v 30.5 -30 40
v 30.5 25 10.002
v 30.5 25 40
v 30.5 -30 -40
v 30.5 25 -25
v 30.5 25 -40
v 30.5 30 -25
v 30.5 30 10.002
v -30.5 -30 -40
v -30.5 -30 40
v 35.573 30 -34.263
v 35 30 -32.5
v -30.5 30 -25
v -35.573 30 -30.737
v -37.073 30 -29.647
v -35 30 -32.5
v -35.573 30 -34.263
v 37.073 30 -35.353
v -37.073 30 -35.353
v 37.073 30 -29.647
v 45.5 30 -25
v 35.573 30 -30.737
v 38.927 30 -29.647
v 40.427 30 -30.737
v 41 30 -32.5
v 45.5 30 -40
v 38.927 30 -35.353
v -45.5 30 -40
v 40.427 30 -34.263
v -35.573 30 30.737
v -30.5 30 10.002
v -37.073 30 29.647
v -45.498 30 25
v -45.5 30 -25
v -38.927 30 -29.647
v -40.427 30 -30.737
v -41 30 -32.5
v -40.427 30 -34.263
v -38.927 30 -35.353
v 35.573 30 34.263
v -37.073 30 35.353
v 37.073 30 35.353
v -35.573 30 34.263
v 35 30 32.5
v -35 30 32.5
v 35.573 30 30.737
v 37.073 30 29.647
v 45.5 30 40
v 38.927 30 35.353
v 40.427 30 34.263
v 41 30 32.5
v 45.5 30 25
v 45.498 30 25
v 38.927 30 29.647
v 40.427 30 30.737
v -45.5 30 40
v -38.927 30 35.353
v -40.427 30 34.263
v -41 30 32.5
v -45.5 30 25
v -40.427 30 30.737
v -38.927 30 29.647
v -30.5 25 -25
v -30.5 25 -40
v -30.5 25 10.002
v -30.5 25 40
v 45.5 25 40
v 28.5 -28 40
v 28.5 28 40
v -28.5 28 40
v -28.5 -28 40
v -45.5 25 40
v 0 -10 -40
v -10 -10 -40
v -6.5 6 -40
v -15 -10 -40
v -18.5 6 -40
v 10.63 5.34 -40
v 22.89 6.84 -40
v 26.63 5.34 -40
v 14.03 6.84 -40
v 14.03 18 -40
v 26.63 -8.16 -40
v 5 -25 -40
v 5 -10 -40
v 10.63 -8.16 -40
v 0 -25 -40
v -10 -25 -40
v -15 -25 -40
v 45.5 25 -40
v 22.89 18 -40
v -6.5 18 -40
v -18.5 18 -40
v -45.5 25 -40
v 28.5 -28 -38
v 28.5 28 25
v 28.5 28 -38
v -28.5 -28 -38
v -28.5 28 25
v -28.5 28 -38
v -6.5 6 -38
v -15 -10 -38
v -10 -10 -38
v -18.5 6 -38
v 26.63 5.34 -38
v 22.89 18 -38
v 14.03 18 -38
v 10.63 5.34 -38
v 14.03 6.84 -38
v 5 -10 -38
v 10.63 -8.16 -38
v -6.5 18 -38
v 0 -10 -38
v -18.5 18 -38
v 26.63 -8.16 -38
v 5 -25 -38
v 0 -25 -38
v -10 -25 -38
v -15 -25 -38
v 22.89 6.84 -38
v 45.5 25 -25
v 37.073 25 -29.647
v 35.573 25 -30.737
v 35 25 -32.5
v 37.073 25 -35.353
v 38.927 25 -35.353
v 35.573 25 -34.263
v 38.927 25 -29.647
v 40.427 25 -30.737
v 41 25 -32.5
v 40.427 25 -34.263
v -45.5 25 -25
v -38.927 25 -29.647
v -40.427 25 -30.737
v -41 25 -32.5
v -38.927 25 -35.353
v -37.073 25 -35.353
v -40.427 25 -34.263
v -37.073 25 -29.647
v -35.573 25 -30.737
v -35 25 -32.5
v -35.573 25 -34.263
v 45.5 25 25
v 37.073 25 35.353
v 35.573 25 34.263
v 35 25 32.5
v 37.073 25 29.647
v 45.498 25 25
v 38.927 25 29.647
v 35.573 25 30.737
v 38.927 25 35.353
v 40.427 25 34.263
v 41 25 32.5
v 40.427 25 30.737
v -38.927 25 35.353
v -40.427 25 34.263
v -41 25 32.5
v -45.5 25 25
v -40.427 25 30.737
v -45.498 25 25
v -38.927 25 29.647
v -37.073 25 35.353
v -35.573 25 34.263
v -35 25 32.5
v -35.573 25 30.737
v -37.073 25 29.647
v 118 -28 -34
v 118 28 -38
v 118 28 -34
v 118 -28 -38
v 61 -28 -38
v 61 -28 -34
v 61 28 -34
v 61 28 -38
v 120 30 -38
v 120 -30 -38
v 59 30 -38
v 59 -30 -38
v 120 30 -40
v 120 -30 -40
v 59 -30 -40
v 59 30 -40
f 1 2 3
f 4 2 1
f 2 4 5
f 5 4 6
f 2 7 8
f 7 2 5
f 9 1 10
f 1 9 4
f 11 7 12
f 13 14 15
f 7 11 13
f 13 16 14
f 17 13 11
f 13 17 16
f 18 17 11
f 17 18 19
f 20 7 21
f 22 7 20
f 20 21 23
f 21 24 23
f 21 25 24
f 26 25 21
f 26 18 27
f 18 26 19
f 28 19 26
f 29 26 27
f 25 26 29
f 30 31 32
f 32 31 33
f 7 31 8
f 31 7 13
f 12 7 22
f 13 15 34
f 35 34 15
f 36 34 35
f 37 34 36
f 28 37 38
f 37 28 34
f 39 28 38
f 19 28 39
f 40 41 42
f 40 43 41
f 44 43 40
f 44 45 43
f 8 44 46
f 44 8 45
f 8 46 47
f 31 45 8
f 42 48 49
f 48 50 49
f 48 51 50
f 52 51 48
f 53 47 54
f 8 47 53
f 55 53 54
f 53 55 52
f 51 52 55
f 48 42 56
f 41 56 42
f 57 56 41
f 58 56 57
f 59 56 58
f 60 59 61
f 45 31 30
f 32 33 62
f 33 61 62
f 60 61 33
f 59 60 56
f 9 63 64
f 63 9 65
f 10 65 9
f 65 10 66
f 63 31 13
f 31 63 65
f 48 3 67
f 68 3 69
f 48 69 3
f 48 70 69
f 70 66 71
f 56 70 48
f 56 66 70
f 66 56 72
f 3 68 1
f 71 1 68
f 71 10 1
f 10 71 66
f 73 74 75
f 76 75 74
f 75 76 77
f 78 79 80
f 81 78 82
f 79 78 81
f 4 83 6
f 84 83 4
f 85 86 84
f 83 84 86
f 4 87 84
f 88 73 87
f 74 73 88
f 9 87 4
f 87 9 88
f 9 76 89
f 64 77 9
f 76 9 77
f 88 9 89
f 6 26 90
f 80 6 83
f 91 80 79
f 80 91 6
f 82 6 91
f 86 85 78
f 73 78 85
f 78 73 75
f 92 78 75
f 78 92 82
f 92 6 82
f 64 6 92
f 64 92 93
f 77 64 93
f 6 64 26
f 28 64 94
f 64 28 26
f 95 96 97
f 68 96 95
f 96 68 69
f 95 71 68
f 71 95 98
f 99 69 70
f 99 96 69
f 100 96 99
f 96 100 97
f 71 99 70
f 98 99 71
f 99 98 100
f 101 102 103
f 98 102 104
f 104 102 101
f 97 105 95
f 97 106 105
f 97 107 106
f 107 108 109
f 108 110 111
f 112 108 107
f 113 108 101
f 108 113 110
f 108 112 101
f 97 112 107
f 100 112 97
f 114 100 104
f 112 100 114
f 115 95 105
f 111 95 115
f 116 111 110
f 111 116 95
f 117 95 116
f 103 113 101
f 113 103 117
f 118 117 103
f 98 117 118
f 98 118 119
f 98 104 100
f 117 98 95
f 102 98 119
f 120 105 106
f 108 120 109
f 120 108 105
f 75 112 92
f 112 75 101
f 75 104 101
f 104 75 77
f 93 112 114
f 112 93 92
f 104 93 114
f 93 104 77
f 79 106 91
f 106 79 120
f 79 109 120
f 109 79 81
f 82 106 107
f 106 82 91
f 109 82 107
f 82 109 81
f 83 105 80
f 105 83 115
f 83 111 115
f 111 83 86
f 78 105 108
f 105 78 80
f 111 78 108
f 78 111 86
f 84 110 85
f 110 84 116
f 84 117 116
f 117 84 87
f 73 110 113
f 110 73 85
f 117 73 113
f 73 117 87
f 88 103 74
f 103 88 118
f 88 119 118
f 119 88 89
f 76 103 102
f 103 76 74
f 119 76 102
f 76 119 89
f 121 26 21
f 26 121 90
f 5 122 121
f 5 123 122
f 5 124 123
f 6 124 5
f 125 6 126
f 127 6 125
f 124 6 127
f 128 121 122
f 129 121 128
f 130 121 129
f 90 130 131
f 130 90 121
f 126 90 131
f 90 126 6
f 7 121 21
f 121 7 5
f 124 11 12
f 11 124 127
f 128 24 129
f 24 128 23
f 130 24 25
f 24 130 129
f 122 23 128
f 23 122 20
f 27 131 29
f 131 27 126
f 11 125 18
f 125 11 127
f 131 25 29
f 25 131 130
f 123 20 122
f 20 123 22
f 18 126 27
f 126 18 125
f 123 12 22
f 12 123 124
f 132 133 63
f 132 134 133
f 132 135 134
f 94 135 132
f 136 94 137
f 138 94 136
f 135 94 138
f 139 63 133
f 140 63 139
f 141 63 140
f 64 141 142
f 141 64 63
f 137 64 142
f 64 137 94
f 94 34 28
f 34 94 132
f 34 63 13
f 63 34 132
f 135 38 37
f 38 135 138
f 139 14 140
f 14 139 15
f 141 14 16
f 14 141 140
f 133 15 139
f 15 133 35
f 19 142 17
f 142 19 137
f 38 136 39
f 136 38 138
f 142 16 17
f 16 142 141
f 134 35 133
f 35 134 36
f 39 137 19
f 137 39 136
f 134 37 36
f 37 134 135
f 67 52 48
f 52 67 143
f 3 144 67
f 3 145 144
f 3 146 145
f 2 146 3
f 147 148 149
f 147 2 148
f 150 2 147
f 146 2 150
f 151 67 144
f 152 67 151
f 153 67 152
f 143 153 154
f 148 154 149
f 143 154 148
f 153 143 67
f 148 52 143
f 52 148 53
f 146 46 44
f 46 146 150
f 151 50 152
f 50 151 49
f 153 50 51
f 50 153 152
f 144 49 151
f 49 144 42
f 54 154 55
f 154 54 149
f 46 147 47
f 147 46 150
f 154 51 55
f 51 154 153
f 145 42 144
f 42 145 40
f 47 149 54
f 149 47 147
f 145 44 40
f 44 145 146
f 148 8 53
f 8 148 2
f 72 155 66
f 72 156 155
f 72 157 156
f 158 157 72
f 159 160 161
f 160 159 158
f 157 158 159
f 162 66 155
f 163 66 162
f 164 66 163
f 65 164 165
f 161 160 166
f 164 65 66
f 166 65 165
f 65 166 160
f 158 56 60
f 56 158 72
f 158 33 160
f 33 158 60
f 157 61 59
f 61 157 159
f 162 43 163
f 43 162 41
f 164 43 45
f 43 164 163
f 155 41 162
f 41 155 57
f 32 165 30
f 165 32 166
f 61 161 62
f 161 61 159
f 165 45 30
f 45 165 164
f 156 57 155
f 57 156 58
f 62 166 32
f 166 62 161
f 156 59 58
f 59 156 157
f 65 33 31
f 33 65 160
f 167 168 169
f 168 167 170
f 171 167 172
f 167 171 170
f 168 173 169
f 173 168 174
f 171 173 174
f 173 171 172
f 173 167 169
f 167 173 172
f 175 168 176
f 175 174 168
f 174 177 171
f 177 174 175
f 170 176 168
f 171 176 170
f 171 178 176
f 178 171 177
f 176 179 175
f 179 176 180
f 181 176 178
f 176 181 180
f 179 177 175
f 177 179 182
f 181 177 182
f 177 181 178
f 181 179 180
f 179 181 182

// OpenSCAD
wall_thickness = 2;
outer_width = 57 + 2*wall_thickness;
outer_length = 76 + 2*wall_thickness;
outer_height = 56 + 2*wall_thickness;

module hole() {
  translate([7.5, 7.5, 2.5]) difference() {
    cube(size=[15, 15, 5], center=true);
    cylinder(r=3, h=30, center=true);
  }
}

module spanner() {
  translate([7.5, 7.5, 2.5]) difference() {
    difference() {
      translate([7.50,-7.5,0]) rotate(45,[0,0,1]) cube(size=[21.21, 21.21, 5], center=true);
      cube(size=[50, 15, 10], center=true);
    }
  }
}

rotate(90, [1,0,0]) {
  difference() {
    translate(-outer_width/2, -outer_length/2, 0) {
      difference() {
        cube(size=[outer_width, outer_length, outer_height], center=true);
        translate([0,2,0]) cube(size=[outer_width-4, outer_length, outer_height-4], center=true);
      }
    }

    translate([-outer_width/2+2+10, -outer_length/2-2, -outer_height/2+2+10]) cube(size=[12, 5, 12]);
    translate([outer_width/2-16.47, -outer_length/2-2, -outer_height/2+2+10]) cube(size=[8.86, 5, 11.16]);
    translate([outer_width/2-19.87, -outer_length/2-2, -outer_height/2+2+10+12.66]) cube(size=[16, 5, 13.5]);

    translate([0,-outer_length/2-2, 10]) cube(size=[5, 16, 15]);
    translate([-15,-outer_length/2-2, 10]) cube(size=[5, 16, 15]);

  }
  difference() {
    union() {
      translate([outer_width/2, -outer_length/2, -outer_height/2]) hole();
      translate([-outer_width/2-15, -outer_length/2, -outer_height/2]) hole();
      translate([outer_width/2, outer_length/2-15, -outer_height/2]) {
        hole();
        translate([-15,0,0])spanner();
      }
      translate([-outer_width/2-15, outer_length/2-15, -outer_height/2]) {
        hole(); spanner();
      }
    }

    translate(-outer_width/2, 2-outer_length/2, 0) {
      cube(size=[outer_width-4, outer_length, outer_height-4], center=true);
    }
  }
  translate([outer_width, -outer_length/2+2, -outer_height/2+2]) {
    cube(size=[outer_width-wall_thickness*2, 4, outer_height-wall_thickness*2]);
    translate([-2,-2,-2]) cube(size=[outer_width, 2, outer_height]);
  }
}
